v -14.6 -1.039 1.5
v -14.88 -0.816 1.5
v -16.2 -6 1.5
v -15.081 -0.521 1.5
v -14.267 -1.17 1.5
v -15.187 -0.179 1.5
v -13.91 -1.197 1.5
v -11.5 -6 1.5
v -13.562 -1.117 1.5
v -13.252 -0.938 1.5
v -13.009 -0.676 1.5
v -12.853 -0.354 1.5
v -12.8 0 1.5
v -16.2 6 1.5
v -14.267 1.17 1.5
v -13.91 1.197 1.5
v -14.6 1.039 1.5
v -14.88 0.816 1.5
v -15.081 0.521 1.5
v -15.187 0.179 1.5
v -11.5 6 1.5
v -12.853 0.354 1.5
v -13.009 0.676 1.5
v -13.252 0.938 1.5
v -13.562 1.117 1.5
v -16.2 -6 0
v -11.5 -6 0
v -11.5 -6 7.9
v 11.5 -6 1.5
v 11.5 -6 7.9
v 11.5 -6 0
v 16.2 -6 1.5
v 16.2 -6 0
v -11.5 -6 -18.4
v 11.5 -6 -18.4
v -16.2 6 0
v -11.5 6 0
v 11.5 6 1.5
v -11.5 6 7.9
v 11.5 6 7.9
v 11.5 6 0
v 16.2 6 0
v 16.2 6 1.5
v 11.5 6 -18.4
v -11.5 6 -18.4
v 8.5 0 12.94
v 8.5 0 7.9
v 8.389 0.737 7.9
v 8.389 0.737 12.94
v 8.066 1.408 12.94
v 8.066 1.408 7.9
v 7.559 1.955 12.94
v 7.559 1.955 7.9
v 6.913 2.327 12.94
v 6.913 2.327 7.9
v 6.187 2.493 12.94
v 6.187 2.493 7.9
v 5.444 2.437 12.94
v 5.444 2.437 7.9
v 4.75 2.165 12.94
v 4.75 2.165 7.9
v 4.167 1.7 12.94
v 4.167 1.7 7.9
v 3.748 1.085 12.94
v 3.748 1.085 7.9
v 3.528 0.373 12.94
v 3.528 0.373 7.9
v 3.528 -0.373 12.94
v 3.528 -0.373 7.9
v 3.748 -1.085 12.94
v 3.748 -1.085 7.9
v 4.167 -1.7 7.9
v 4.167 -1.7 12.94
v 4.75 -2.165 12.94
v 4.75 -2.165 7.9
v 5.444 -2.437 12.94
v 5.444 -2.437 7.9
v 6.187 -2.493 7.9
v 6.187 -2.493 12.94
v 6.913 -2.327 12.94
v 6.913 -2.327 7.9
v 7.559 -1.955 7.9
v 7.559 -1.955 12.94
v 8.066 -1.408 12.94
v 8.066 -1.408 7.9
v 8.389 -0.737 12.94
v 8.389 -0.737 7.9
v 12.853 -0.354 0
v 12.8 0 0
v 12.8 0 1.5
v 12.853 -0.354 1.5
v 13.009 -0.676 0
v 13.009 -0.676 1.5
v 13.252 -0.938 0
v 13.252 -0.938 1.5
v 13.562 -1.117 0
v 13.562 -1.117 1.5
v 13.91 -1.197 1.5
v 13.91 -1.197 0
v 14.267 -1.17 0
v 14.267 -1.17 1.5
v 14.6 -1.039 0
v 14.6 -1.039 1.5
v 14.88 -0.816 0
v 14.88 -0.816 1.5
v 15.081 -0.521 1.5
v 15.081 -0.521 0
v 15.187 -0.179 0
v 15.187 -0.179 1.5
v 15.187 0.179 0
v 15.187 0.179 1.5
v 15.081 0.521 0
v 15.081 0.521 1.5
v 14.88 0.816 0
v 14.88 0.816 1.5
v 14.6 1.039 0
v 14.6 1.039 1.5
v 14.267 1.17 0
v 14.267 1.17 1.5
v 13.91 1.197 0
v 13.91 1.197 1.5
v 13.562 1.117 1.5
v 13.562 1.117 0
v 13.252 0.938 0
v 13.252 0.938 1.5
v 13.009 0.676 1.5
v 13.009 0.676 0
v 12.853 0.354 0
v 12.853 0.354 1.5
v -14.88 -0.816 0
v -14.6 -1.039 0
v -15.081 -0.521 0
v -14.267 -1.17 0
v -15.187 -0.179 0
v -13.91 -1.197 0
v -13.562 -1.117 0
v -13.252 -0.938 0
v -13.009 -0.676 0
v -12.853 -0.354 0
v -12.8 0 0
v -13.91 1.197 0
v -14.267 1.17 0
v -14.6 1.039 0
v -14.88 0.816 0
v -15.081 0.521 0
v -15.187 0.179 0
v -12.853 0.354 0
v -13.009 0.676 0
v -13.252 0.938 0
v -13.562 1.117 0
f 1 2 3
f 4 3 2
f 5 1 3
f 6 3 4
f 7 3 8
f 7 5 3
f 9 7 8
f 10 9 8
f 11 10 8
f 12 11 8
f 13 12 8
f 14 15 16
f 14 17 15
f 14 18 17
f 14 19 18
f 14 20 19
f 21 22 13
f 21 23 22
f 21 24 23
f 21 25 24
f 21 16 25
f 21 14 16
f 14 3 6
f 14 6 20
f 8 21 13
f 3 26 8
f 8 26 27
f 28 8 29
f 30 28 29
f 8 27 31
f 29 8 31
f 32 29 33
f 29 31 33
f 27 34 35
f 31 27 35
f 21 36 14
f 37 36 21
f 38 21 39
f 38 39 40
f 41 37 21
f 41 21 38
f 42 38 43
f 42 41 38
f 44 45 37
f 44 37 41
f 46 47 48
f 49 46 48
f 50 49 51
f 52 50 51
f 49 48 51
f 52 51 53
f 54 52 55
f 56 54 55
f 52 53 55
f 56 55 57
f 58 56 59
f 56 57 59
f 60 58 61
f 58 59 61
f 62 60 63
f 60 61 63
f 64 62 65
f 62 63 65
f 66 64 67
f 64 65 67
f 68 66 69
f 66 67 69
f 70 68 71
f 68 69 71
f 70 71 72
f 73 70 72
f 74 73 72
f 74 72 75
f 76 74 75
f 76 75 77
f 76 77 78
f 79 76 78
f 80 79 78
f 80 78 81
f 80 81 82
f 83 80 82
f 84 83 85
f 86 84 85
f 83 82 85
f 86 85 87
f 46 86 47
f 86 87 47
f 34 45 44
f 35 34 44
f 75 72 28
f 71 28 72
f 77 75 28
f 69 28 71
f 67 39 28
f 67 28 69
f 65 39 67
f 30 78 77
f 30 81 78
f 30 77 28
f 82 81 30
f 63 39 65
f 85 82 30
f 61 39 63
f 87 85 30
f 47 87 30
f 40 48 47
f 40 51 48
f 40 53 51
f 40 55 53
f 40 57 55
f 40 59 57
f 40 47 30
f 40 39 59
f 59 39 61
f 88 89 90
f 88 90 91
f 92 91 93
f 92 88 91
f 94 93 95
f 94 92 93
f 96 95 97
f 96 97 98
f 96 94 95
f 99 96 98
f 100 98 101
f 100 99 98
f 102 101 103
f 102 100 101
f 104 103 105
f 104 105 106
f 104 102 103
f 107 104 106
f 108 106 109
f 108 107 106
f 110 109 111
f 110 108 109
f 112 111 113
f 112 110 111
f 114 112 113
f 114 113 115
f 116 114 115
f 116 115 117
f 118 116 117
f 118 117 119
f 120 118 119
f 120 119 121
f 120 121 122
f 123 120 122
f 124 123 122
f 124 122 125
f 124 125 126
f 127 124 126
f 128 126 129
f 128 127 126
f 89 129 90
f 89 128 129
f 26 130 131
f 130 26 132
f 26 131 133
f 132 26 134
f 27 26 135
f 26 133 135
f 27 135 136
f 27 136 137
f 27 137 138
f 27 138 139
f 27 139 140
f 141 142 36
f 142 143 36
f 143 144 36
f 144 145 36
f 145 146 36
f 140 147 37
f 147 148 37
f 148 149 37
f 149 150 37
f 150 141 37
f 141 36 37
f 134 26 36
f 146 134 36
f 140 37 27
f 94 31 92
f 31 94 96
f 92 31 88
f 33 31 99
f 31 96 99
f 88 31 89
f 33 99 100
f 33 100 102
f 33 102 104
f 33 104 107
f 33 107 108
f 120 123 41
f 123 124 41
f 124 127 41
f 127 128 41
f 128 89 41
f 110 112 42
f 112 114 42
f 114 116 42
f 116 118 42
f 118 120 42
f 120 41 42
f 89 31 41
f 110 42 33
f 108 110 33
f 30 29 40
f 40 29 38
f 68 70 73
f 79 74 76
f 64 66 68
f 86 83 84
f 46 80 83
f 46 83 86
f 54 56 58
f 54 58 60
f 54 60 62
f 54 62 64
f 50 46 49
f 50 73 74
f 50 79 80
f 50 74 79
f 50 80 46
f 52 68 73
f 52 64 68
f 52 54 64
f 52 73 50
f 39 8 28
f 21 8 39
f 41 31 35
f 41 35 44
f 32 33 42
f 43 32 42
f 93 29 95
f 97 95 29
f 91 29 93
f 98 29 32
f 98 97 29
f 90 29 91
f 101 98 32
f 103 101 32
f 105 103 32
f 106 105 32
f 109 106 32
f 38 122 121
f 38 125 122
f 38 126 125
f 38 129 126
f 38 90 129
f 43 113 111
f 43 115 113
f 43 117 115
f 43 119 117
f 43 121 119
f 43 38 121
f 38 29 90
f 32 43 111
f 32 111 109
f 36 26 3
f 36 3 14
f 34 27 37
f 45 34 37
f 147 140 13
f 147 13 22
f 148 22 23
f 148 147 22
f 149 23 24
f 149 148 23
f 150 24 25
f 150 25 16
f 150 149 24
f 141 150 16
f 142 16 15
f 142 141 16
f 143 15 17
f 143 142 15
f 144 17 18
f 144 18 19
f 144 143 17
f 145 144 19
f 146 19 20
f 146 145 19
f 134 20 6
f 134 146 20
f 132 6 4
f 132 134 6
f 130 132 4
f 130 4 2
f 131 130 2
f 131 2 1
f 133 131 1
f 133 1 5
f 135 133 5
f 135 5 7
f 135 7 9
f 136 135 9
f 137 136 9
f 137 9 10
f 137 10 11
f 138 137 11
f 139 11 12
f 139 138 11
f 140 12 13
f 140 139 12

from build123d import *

# Parameters (mm, degrees)
SKETCH_1_W           = 32.4
SKETCH_1_H           = 12
SKETCH_1_R           = 1.2
EXTRUDE_1_DEPTH      = 1.5
EXTRUDE_2_DEPTH      = 6.4
EXTRUDE_2_DEPTH_BACK = 19.9
SKETCH_2_W           = 23
SKETCH_2_H           = 12
SKETCH_3_R           = 2.5
EXTRUDE_3_DEPTH      = 5.04


with BuildPart() as part:
    # 草图1 → 凸台-拉伸1 (new body)
    with BuildSketch(Plane.XY):
        Rectangle(SKETCH_1_W, SKETCH_1_H)
        with Locations((-14, 0)):
            Circle(SKETCH_1_R, mode=Mode.SUBTRACT)
        with Locations(Location((14, 0, 0), (0, 0, 180))):
            Circle(SKETCH_1_R, mode=Mode.SUBTRACT)
    extrude(amount=EXTRUDE_1_DEPTH)

    # 草图2 → 凸台-拉伸2 (add, two sides: drawn at the far end of the back side and taken through both)
    with BuildSketch(Plane.XY.offset(1.5).offset(-EXTRUDE_2_DEPTH_BACK)):
        Rectangle(SKETCH_2_W, SKETCH_2_H)
    extrude(amount=EXTRUDE_2_DEPTH + EXTRUDE_2_DEPTH_BACK)

    # 草图3 → 凸台-拉伸3 (add)
    with BuildSketch(Plane.XY.offset(7.9)):
        with Locations((6, 0)):
            Circle(SKETCH_3_R)
    extrude(amount=EXTRUDE_3_DEPTH)


solid = part.part
